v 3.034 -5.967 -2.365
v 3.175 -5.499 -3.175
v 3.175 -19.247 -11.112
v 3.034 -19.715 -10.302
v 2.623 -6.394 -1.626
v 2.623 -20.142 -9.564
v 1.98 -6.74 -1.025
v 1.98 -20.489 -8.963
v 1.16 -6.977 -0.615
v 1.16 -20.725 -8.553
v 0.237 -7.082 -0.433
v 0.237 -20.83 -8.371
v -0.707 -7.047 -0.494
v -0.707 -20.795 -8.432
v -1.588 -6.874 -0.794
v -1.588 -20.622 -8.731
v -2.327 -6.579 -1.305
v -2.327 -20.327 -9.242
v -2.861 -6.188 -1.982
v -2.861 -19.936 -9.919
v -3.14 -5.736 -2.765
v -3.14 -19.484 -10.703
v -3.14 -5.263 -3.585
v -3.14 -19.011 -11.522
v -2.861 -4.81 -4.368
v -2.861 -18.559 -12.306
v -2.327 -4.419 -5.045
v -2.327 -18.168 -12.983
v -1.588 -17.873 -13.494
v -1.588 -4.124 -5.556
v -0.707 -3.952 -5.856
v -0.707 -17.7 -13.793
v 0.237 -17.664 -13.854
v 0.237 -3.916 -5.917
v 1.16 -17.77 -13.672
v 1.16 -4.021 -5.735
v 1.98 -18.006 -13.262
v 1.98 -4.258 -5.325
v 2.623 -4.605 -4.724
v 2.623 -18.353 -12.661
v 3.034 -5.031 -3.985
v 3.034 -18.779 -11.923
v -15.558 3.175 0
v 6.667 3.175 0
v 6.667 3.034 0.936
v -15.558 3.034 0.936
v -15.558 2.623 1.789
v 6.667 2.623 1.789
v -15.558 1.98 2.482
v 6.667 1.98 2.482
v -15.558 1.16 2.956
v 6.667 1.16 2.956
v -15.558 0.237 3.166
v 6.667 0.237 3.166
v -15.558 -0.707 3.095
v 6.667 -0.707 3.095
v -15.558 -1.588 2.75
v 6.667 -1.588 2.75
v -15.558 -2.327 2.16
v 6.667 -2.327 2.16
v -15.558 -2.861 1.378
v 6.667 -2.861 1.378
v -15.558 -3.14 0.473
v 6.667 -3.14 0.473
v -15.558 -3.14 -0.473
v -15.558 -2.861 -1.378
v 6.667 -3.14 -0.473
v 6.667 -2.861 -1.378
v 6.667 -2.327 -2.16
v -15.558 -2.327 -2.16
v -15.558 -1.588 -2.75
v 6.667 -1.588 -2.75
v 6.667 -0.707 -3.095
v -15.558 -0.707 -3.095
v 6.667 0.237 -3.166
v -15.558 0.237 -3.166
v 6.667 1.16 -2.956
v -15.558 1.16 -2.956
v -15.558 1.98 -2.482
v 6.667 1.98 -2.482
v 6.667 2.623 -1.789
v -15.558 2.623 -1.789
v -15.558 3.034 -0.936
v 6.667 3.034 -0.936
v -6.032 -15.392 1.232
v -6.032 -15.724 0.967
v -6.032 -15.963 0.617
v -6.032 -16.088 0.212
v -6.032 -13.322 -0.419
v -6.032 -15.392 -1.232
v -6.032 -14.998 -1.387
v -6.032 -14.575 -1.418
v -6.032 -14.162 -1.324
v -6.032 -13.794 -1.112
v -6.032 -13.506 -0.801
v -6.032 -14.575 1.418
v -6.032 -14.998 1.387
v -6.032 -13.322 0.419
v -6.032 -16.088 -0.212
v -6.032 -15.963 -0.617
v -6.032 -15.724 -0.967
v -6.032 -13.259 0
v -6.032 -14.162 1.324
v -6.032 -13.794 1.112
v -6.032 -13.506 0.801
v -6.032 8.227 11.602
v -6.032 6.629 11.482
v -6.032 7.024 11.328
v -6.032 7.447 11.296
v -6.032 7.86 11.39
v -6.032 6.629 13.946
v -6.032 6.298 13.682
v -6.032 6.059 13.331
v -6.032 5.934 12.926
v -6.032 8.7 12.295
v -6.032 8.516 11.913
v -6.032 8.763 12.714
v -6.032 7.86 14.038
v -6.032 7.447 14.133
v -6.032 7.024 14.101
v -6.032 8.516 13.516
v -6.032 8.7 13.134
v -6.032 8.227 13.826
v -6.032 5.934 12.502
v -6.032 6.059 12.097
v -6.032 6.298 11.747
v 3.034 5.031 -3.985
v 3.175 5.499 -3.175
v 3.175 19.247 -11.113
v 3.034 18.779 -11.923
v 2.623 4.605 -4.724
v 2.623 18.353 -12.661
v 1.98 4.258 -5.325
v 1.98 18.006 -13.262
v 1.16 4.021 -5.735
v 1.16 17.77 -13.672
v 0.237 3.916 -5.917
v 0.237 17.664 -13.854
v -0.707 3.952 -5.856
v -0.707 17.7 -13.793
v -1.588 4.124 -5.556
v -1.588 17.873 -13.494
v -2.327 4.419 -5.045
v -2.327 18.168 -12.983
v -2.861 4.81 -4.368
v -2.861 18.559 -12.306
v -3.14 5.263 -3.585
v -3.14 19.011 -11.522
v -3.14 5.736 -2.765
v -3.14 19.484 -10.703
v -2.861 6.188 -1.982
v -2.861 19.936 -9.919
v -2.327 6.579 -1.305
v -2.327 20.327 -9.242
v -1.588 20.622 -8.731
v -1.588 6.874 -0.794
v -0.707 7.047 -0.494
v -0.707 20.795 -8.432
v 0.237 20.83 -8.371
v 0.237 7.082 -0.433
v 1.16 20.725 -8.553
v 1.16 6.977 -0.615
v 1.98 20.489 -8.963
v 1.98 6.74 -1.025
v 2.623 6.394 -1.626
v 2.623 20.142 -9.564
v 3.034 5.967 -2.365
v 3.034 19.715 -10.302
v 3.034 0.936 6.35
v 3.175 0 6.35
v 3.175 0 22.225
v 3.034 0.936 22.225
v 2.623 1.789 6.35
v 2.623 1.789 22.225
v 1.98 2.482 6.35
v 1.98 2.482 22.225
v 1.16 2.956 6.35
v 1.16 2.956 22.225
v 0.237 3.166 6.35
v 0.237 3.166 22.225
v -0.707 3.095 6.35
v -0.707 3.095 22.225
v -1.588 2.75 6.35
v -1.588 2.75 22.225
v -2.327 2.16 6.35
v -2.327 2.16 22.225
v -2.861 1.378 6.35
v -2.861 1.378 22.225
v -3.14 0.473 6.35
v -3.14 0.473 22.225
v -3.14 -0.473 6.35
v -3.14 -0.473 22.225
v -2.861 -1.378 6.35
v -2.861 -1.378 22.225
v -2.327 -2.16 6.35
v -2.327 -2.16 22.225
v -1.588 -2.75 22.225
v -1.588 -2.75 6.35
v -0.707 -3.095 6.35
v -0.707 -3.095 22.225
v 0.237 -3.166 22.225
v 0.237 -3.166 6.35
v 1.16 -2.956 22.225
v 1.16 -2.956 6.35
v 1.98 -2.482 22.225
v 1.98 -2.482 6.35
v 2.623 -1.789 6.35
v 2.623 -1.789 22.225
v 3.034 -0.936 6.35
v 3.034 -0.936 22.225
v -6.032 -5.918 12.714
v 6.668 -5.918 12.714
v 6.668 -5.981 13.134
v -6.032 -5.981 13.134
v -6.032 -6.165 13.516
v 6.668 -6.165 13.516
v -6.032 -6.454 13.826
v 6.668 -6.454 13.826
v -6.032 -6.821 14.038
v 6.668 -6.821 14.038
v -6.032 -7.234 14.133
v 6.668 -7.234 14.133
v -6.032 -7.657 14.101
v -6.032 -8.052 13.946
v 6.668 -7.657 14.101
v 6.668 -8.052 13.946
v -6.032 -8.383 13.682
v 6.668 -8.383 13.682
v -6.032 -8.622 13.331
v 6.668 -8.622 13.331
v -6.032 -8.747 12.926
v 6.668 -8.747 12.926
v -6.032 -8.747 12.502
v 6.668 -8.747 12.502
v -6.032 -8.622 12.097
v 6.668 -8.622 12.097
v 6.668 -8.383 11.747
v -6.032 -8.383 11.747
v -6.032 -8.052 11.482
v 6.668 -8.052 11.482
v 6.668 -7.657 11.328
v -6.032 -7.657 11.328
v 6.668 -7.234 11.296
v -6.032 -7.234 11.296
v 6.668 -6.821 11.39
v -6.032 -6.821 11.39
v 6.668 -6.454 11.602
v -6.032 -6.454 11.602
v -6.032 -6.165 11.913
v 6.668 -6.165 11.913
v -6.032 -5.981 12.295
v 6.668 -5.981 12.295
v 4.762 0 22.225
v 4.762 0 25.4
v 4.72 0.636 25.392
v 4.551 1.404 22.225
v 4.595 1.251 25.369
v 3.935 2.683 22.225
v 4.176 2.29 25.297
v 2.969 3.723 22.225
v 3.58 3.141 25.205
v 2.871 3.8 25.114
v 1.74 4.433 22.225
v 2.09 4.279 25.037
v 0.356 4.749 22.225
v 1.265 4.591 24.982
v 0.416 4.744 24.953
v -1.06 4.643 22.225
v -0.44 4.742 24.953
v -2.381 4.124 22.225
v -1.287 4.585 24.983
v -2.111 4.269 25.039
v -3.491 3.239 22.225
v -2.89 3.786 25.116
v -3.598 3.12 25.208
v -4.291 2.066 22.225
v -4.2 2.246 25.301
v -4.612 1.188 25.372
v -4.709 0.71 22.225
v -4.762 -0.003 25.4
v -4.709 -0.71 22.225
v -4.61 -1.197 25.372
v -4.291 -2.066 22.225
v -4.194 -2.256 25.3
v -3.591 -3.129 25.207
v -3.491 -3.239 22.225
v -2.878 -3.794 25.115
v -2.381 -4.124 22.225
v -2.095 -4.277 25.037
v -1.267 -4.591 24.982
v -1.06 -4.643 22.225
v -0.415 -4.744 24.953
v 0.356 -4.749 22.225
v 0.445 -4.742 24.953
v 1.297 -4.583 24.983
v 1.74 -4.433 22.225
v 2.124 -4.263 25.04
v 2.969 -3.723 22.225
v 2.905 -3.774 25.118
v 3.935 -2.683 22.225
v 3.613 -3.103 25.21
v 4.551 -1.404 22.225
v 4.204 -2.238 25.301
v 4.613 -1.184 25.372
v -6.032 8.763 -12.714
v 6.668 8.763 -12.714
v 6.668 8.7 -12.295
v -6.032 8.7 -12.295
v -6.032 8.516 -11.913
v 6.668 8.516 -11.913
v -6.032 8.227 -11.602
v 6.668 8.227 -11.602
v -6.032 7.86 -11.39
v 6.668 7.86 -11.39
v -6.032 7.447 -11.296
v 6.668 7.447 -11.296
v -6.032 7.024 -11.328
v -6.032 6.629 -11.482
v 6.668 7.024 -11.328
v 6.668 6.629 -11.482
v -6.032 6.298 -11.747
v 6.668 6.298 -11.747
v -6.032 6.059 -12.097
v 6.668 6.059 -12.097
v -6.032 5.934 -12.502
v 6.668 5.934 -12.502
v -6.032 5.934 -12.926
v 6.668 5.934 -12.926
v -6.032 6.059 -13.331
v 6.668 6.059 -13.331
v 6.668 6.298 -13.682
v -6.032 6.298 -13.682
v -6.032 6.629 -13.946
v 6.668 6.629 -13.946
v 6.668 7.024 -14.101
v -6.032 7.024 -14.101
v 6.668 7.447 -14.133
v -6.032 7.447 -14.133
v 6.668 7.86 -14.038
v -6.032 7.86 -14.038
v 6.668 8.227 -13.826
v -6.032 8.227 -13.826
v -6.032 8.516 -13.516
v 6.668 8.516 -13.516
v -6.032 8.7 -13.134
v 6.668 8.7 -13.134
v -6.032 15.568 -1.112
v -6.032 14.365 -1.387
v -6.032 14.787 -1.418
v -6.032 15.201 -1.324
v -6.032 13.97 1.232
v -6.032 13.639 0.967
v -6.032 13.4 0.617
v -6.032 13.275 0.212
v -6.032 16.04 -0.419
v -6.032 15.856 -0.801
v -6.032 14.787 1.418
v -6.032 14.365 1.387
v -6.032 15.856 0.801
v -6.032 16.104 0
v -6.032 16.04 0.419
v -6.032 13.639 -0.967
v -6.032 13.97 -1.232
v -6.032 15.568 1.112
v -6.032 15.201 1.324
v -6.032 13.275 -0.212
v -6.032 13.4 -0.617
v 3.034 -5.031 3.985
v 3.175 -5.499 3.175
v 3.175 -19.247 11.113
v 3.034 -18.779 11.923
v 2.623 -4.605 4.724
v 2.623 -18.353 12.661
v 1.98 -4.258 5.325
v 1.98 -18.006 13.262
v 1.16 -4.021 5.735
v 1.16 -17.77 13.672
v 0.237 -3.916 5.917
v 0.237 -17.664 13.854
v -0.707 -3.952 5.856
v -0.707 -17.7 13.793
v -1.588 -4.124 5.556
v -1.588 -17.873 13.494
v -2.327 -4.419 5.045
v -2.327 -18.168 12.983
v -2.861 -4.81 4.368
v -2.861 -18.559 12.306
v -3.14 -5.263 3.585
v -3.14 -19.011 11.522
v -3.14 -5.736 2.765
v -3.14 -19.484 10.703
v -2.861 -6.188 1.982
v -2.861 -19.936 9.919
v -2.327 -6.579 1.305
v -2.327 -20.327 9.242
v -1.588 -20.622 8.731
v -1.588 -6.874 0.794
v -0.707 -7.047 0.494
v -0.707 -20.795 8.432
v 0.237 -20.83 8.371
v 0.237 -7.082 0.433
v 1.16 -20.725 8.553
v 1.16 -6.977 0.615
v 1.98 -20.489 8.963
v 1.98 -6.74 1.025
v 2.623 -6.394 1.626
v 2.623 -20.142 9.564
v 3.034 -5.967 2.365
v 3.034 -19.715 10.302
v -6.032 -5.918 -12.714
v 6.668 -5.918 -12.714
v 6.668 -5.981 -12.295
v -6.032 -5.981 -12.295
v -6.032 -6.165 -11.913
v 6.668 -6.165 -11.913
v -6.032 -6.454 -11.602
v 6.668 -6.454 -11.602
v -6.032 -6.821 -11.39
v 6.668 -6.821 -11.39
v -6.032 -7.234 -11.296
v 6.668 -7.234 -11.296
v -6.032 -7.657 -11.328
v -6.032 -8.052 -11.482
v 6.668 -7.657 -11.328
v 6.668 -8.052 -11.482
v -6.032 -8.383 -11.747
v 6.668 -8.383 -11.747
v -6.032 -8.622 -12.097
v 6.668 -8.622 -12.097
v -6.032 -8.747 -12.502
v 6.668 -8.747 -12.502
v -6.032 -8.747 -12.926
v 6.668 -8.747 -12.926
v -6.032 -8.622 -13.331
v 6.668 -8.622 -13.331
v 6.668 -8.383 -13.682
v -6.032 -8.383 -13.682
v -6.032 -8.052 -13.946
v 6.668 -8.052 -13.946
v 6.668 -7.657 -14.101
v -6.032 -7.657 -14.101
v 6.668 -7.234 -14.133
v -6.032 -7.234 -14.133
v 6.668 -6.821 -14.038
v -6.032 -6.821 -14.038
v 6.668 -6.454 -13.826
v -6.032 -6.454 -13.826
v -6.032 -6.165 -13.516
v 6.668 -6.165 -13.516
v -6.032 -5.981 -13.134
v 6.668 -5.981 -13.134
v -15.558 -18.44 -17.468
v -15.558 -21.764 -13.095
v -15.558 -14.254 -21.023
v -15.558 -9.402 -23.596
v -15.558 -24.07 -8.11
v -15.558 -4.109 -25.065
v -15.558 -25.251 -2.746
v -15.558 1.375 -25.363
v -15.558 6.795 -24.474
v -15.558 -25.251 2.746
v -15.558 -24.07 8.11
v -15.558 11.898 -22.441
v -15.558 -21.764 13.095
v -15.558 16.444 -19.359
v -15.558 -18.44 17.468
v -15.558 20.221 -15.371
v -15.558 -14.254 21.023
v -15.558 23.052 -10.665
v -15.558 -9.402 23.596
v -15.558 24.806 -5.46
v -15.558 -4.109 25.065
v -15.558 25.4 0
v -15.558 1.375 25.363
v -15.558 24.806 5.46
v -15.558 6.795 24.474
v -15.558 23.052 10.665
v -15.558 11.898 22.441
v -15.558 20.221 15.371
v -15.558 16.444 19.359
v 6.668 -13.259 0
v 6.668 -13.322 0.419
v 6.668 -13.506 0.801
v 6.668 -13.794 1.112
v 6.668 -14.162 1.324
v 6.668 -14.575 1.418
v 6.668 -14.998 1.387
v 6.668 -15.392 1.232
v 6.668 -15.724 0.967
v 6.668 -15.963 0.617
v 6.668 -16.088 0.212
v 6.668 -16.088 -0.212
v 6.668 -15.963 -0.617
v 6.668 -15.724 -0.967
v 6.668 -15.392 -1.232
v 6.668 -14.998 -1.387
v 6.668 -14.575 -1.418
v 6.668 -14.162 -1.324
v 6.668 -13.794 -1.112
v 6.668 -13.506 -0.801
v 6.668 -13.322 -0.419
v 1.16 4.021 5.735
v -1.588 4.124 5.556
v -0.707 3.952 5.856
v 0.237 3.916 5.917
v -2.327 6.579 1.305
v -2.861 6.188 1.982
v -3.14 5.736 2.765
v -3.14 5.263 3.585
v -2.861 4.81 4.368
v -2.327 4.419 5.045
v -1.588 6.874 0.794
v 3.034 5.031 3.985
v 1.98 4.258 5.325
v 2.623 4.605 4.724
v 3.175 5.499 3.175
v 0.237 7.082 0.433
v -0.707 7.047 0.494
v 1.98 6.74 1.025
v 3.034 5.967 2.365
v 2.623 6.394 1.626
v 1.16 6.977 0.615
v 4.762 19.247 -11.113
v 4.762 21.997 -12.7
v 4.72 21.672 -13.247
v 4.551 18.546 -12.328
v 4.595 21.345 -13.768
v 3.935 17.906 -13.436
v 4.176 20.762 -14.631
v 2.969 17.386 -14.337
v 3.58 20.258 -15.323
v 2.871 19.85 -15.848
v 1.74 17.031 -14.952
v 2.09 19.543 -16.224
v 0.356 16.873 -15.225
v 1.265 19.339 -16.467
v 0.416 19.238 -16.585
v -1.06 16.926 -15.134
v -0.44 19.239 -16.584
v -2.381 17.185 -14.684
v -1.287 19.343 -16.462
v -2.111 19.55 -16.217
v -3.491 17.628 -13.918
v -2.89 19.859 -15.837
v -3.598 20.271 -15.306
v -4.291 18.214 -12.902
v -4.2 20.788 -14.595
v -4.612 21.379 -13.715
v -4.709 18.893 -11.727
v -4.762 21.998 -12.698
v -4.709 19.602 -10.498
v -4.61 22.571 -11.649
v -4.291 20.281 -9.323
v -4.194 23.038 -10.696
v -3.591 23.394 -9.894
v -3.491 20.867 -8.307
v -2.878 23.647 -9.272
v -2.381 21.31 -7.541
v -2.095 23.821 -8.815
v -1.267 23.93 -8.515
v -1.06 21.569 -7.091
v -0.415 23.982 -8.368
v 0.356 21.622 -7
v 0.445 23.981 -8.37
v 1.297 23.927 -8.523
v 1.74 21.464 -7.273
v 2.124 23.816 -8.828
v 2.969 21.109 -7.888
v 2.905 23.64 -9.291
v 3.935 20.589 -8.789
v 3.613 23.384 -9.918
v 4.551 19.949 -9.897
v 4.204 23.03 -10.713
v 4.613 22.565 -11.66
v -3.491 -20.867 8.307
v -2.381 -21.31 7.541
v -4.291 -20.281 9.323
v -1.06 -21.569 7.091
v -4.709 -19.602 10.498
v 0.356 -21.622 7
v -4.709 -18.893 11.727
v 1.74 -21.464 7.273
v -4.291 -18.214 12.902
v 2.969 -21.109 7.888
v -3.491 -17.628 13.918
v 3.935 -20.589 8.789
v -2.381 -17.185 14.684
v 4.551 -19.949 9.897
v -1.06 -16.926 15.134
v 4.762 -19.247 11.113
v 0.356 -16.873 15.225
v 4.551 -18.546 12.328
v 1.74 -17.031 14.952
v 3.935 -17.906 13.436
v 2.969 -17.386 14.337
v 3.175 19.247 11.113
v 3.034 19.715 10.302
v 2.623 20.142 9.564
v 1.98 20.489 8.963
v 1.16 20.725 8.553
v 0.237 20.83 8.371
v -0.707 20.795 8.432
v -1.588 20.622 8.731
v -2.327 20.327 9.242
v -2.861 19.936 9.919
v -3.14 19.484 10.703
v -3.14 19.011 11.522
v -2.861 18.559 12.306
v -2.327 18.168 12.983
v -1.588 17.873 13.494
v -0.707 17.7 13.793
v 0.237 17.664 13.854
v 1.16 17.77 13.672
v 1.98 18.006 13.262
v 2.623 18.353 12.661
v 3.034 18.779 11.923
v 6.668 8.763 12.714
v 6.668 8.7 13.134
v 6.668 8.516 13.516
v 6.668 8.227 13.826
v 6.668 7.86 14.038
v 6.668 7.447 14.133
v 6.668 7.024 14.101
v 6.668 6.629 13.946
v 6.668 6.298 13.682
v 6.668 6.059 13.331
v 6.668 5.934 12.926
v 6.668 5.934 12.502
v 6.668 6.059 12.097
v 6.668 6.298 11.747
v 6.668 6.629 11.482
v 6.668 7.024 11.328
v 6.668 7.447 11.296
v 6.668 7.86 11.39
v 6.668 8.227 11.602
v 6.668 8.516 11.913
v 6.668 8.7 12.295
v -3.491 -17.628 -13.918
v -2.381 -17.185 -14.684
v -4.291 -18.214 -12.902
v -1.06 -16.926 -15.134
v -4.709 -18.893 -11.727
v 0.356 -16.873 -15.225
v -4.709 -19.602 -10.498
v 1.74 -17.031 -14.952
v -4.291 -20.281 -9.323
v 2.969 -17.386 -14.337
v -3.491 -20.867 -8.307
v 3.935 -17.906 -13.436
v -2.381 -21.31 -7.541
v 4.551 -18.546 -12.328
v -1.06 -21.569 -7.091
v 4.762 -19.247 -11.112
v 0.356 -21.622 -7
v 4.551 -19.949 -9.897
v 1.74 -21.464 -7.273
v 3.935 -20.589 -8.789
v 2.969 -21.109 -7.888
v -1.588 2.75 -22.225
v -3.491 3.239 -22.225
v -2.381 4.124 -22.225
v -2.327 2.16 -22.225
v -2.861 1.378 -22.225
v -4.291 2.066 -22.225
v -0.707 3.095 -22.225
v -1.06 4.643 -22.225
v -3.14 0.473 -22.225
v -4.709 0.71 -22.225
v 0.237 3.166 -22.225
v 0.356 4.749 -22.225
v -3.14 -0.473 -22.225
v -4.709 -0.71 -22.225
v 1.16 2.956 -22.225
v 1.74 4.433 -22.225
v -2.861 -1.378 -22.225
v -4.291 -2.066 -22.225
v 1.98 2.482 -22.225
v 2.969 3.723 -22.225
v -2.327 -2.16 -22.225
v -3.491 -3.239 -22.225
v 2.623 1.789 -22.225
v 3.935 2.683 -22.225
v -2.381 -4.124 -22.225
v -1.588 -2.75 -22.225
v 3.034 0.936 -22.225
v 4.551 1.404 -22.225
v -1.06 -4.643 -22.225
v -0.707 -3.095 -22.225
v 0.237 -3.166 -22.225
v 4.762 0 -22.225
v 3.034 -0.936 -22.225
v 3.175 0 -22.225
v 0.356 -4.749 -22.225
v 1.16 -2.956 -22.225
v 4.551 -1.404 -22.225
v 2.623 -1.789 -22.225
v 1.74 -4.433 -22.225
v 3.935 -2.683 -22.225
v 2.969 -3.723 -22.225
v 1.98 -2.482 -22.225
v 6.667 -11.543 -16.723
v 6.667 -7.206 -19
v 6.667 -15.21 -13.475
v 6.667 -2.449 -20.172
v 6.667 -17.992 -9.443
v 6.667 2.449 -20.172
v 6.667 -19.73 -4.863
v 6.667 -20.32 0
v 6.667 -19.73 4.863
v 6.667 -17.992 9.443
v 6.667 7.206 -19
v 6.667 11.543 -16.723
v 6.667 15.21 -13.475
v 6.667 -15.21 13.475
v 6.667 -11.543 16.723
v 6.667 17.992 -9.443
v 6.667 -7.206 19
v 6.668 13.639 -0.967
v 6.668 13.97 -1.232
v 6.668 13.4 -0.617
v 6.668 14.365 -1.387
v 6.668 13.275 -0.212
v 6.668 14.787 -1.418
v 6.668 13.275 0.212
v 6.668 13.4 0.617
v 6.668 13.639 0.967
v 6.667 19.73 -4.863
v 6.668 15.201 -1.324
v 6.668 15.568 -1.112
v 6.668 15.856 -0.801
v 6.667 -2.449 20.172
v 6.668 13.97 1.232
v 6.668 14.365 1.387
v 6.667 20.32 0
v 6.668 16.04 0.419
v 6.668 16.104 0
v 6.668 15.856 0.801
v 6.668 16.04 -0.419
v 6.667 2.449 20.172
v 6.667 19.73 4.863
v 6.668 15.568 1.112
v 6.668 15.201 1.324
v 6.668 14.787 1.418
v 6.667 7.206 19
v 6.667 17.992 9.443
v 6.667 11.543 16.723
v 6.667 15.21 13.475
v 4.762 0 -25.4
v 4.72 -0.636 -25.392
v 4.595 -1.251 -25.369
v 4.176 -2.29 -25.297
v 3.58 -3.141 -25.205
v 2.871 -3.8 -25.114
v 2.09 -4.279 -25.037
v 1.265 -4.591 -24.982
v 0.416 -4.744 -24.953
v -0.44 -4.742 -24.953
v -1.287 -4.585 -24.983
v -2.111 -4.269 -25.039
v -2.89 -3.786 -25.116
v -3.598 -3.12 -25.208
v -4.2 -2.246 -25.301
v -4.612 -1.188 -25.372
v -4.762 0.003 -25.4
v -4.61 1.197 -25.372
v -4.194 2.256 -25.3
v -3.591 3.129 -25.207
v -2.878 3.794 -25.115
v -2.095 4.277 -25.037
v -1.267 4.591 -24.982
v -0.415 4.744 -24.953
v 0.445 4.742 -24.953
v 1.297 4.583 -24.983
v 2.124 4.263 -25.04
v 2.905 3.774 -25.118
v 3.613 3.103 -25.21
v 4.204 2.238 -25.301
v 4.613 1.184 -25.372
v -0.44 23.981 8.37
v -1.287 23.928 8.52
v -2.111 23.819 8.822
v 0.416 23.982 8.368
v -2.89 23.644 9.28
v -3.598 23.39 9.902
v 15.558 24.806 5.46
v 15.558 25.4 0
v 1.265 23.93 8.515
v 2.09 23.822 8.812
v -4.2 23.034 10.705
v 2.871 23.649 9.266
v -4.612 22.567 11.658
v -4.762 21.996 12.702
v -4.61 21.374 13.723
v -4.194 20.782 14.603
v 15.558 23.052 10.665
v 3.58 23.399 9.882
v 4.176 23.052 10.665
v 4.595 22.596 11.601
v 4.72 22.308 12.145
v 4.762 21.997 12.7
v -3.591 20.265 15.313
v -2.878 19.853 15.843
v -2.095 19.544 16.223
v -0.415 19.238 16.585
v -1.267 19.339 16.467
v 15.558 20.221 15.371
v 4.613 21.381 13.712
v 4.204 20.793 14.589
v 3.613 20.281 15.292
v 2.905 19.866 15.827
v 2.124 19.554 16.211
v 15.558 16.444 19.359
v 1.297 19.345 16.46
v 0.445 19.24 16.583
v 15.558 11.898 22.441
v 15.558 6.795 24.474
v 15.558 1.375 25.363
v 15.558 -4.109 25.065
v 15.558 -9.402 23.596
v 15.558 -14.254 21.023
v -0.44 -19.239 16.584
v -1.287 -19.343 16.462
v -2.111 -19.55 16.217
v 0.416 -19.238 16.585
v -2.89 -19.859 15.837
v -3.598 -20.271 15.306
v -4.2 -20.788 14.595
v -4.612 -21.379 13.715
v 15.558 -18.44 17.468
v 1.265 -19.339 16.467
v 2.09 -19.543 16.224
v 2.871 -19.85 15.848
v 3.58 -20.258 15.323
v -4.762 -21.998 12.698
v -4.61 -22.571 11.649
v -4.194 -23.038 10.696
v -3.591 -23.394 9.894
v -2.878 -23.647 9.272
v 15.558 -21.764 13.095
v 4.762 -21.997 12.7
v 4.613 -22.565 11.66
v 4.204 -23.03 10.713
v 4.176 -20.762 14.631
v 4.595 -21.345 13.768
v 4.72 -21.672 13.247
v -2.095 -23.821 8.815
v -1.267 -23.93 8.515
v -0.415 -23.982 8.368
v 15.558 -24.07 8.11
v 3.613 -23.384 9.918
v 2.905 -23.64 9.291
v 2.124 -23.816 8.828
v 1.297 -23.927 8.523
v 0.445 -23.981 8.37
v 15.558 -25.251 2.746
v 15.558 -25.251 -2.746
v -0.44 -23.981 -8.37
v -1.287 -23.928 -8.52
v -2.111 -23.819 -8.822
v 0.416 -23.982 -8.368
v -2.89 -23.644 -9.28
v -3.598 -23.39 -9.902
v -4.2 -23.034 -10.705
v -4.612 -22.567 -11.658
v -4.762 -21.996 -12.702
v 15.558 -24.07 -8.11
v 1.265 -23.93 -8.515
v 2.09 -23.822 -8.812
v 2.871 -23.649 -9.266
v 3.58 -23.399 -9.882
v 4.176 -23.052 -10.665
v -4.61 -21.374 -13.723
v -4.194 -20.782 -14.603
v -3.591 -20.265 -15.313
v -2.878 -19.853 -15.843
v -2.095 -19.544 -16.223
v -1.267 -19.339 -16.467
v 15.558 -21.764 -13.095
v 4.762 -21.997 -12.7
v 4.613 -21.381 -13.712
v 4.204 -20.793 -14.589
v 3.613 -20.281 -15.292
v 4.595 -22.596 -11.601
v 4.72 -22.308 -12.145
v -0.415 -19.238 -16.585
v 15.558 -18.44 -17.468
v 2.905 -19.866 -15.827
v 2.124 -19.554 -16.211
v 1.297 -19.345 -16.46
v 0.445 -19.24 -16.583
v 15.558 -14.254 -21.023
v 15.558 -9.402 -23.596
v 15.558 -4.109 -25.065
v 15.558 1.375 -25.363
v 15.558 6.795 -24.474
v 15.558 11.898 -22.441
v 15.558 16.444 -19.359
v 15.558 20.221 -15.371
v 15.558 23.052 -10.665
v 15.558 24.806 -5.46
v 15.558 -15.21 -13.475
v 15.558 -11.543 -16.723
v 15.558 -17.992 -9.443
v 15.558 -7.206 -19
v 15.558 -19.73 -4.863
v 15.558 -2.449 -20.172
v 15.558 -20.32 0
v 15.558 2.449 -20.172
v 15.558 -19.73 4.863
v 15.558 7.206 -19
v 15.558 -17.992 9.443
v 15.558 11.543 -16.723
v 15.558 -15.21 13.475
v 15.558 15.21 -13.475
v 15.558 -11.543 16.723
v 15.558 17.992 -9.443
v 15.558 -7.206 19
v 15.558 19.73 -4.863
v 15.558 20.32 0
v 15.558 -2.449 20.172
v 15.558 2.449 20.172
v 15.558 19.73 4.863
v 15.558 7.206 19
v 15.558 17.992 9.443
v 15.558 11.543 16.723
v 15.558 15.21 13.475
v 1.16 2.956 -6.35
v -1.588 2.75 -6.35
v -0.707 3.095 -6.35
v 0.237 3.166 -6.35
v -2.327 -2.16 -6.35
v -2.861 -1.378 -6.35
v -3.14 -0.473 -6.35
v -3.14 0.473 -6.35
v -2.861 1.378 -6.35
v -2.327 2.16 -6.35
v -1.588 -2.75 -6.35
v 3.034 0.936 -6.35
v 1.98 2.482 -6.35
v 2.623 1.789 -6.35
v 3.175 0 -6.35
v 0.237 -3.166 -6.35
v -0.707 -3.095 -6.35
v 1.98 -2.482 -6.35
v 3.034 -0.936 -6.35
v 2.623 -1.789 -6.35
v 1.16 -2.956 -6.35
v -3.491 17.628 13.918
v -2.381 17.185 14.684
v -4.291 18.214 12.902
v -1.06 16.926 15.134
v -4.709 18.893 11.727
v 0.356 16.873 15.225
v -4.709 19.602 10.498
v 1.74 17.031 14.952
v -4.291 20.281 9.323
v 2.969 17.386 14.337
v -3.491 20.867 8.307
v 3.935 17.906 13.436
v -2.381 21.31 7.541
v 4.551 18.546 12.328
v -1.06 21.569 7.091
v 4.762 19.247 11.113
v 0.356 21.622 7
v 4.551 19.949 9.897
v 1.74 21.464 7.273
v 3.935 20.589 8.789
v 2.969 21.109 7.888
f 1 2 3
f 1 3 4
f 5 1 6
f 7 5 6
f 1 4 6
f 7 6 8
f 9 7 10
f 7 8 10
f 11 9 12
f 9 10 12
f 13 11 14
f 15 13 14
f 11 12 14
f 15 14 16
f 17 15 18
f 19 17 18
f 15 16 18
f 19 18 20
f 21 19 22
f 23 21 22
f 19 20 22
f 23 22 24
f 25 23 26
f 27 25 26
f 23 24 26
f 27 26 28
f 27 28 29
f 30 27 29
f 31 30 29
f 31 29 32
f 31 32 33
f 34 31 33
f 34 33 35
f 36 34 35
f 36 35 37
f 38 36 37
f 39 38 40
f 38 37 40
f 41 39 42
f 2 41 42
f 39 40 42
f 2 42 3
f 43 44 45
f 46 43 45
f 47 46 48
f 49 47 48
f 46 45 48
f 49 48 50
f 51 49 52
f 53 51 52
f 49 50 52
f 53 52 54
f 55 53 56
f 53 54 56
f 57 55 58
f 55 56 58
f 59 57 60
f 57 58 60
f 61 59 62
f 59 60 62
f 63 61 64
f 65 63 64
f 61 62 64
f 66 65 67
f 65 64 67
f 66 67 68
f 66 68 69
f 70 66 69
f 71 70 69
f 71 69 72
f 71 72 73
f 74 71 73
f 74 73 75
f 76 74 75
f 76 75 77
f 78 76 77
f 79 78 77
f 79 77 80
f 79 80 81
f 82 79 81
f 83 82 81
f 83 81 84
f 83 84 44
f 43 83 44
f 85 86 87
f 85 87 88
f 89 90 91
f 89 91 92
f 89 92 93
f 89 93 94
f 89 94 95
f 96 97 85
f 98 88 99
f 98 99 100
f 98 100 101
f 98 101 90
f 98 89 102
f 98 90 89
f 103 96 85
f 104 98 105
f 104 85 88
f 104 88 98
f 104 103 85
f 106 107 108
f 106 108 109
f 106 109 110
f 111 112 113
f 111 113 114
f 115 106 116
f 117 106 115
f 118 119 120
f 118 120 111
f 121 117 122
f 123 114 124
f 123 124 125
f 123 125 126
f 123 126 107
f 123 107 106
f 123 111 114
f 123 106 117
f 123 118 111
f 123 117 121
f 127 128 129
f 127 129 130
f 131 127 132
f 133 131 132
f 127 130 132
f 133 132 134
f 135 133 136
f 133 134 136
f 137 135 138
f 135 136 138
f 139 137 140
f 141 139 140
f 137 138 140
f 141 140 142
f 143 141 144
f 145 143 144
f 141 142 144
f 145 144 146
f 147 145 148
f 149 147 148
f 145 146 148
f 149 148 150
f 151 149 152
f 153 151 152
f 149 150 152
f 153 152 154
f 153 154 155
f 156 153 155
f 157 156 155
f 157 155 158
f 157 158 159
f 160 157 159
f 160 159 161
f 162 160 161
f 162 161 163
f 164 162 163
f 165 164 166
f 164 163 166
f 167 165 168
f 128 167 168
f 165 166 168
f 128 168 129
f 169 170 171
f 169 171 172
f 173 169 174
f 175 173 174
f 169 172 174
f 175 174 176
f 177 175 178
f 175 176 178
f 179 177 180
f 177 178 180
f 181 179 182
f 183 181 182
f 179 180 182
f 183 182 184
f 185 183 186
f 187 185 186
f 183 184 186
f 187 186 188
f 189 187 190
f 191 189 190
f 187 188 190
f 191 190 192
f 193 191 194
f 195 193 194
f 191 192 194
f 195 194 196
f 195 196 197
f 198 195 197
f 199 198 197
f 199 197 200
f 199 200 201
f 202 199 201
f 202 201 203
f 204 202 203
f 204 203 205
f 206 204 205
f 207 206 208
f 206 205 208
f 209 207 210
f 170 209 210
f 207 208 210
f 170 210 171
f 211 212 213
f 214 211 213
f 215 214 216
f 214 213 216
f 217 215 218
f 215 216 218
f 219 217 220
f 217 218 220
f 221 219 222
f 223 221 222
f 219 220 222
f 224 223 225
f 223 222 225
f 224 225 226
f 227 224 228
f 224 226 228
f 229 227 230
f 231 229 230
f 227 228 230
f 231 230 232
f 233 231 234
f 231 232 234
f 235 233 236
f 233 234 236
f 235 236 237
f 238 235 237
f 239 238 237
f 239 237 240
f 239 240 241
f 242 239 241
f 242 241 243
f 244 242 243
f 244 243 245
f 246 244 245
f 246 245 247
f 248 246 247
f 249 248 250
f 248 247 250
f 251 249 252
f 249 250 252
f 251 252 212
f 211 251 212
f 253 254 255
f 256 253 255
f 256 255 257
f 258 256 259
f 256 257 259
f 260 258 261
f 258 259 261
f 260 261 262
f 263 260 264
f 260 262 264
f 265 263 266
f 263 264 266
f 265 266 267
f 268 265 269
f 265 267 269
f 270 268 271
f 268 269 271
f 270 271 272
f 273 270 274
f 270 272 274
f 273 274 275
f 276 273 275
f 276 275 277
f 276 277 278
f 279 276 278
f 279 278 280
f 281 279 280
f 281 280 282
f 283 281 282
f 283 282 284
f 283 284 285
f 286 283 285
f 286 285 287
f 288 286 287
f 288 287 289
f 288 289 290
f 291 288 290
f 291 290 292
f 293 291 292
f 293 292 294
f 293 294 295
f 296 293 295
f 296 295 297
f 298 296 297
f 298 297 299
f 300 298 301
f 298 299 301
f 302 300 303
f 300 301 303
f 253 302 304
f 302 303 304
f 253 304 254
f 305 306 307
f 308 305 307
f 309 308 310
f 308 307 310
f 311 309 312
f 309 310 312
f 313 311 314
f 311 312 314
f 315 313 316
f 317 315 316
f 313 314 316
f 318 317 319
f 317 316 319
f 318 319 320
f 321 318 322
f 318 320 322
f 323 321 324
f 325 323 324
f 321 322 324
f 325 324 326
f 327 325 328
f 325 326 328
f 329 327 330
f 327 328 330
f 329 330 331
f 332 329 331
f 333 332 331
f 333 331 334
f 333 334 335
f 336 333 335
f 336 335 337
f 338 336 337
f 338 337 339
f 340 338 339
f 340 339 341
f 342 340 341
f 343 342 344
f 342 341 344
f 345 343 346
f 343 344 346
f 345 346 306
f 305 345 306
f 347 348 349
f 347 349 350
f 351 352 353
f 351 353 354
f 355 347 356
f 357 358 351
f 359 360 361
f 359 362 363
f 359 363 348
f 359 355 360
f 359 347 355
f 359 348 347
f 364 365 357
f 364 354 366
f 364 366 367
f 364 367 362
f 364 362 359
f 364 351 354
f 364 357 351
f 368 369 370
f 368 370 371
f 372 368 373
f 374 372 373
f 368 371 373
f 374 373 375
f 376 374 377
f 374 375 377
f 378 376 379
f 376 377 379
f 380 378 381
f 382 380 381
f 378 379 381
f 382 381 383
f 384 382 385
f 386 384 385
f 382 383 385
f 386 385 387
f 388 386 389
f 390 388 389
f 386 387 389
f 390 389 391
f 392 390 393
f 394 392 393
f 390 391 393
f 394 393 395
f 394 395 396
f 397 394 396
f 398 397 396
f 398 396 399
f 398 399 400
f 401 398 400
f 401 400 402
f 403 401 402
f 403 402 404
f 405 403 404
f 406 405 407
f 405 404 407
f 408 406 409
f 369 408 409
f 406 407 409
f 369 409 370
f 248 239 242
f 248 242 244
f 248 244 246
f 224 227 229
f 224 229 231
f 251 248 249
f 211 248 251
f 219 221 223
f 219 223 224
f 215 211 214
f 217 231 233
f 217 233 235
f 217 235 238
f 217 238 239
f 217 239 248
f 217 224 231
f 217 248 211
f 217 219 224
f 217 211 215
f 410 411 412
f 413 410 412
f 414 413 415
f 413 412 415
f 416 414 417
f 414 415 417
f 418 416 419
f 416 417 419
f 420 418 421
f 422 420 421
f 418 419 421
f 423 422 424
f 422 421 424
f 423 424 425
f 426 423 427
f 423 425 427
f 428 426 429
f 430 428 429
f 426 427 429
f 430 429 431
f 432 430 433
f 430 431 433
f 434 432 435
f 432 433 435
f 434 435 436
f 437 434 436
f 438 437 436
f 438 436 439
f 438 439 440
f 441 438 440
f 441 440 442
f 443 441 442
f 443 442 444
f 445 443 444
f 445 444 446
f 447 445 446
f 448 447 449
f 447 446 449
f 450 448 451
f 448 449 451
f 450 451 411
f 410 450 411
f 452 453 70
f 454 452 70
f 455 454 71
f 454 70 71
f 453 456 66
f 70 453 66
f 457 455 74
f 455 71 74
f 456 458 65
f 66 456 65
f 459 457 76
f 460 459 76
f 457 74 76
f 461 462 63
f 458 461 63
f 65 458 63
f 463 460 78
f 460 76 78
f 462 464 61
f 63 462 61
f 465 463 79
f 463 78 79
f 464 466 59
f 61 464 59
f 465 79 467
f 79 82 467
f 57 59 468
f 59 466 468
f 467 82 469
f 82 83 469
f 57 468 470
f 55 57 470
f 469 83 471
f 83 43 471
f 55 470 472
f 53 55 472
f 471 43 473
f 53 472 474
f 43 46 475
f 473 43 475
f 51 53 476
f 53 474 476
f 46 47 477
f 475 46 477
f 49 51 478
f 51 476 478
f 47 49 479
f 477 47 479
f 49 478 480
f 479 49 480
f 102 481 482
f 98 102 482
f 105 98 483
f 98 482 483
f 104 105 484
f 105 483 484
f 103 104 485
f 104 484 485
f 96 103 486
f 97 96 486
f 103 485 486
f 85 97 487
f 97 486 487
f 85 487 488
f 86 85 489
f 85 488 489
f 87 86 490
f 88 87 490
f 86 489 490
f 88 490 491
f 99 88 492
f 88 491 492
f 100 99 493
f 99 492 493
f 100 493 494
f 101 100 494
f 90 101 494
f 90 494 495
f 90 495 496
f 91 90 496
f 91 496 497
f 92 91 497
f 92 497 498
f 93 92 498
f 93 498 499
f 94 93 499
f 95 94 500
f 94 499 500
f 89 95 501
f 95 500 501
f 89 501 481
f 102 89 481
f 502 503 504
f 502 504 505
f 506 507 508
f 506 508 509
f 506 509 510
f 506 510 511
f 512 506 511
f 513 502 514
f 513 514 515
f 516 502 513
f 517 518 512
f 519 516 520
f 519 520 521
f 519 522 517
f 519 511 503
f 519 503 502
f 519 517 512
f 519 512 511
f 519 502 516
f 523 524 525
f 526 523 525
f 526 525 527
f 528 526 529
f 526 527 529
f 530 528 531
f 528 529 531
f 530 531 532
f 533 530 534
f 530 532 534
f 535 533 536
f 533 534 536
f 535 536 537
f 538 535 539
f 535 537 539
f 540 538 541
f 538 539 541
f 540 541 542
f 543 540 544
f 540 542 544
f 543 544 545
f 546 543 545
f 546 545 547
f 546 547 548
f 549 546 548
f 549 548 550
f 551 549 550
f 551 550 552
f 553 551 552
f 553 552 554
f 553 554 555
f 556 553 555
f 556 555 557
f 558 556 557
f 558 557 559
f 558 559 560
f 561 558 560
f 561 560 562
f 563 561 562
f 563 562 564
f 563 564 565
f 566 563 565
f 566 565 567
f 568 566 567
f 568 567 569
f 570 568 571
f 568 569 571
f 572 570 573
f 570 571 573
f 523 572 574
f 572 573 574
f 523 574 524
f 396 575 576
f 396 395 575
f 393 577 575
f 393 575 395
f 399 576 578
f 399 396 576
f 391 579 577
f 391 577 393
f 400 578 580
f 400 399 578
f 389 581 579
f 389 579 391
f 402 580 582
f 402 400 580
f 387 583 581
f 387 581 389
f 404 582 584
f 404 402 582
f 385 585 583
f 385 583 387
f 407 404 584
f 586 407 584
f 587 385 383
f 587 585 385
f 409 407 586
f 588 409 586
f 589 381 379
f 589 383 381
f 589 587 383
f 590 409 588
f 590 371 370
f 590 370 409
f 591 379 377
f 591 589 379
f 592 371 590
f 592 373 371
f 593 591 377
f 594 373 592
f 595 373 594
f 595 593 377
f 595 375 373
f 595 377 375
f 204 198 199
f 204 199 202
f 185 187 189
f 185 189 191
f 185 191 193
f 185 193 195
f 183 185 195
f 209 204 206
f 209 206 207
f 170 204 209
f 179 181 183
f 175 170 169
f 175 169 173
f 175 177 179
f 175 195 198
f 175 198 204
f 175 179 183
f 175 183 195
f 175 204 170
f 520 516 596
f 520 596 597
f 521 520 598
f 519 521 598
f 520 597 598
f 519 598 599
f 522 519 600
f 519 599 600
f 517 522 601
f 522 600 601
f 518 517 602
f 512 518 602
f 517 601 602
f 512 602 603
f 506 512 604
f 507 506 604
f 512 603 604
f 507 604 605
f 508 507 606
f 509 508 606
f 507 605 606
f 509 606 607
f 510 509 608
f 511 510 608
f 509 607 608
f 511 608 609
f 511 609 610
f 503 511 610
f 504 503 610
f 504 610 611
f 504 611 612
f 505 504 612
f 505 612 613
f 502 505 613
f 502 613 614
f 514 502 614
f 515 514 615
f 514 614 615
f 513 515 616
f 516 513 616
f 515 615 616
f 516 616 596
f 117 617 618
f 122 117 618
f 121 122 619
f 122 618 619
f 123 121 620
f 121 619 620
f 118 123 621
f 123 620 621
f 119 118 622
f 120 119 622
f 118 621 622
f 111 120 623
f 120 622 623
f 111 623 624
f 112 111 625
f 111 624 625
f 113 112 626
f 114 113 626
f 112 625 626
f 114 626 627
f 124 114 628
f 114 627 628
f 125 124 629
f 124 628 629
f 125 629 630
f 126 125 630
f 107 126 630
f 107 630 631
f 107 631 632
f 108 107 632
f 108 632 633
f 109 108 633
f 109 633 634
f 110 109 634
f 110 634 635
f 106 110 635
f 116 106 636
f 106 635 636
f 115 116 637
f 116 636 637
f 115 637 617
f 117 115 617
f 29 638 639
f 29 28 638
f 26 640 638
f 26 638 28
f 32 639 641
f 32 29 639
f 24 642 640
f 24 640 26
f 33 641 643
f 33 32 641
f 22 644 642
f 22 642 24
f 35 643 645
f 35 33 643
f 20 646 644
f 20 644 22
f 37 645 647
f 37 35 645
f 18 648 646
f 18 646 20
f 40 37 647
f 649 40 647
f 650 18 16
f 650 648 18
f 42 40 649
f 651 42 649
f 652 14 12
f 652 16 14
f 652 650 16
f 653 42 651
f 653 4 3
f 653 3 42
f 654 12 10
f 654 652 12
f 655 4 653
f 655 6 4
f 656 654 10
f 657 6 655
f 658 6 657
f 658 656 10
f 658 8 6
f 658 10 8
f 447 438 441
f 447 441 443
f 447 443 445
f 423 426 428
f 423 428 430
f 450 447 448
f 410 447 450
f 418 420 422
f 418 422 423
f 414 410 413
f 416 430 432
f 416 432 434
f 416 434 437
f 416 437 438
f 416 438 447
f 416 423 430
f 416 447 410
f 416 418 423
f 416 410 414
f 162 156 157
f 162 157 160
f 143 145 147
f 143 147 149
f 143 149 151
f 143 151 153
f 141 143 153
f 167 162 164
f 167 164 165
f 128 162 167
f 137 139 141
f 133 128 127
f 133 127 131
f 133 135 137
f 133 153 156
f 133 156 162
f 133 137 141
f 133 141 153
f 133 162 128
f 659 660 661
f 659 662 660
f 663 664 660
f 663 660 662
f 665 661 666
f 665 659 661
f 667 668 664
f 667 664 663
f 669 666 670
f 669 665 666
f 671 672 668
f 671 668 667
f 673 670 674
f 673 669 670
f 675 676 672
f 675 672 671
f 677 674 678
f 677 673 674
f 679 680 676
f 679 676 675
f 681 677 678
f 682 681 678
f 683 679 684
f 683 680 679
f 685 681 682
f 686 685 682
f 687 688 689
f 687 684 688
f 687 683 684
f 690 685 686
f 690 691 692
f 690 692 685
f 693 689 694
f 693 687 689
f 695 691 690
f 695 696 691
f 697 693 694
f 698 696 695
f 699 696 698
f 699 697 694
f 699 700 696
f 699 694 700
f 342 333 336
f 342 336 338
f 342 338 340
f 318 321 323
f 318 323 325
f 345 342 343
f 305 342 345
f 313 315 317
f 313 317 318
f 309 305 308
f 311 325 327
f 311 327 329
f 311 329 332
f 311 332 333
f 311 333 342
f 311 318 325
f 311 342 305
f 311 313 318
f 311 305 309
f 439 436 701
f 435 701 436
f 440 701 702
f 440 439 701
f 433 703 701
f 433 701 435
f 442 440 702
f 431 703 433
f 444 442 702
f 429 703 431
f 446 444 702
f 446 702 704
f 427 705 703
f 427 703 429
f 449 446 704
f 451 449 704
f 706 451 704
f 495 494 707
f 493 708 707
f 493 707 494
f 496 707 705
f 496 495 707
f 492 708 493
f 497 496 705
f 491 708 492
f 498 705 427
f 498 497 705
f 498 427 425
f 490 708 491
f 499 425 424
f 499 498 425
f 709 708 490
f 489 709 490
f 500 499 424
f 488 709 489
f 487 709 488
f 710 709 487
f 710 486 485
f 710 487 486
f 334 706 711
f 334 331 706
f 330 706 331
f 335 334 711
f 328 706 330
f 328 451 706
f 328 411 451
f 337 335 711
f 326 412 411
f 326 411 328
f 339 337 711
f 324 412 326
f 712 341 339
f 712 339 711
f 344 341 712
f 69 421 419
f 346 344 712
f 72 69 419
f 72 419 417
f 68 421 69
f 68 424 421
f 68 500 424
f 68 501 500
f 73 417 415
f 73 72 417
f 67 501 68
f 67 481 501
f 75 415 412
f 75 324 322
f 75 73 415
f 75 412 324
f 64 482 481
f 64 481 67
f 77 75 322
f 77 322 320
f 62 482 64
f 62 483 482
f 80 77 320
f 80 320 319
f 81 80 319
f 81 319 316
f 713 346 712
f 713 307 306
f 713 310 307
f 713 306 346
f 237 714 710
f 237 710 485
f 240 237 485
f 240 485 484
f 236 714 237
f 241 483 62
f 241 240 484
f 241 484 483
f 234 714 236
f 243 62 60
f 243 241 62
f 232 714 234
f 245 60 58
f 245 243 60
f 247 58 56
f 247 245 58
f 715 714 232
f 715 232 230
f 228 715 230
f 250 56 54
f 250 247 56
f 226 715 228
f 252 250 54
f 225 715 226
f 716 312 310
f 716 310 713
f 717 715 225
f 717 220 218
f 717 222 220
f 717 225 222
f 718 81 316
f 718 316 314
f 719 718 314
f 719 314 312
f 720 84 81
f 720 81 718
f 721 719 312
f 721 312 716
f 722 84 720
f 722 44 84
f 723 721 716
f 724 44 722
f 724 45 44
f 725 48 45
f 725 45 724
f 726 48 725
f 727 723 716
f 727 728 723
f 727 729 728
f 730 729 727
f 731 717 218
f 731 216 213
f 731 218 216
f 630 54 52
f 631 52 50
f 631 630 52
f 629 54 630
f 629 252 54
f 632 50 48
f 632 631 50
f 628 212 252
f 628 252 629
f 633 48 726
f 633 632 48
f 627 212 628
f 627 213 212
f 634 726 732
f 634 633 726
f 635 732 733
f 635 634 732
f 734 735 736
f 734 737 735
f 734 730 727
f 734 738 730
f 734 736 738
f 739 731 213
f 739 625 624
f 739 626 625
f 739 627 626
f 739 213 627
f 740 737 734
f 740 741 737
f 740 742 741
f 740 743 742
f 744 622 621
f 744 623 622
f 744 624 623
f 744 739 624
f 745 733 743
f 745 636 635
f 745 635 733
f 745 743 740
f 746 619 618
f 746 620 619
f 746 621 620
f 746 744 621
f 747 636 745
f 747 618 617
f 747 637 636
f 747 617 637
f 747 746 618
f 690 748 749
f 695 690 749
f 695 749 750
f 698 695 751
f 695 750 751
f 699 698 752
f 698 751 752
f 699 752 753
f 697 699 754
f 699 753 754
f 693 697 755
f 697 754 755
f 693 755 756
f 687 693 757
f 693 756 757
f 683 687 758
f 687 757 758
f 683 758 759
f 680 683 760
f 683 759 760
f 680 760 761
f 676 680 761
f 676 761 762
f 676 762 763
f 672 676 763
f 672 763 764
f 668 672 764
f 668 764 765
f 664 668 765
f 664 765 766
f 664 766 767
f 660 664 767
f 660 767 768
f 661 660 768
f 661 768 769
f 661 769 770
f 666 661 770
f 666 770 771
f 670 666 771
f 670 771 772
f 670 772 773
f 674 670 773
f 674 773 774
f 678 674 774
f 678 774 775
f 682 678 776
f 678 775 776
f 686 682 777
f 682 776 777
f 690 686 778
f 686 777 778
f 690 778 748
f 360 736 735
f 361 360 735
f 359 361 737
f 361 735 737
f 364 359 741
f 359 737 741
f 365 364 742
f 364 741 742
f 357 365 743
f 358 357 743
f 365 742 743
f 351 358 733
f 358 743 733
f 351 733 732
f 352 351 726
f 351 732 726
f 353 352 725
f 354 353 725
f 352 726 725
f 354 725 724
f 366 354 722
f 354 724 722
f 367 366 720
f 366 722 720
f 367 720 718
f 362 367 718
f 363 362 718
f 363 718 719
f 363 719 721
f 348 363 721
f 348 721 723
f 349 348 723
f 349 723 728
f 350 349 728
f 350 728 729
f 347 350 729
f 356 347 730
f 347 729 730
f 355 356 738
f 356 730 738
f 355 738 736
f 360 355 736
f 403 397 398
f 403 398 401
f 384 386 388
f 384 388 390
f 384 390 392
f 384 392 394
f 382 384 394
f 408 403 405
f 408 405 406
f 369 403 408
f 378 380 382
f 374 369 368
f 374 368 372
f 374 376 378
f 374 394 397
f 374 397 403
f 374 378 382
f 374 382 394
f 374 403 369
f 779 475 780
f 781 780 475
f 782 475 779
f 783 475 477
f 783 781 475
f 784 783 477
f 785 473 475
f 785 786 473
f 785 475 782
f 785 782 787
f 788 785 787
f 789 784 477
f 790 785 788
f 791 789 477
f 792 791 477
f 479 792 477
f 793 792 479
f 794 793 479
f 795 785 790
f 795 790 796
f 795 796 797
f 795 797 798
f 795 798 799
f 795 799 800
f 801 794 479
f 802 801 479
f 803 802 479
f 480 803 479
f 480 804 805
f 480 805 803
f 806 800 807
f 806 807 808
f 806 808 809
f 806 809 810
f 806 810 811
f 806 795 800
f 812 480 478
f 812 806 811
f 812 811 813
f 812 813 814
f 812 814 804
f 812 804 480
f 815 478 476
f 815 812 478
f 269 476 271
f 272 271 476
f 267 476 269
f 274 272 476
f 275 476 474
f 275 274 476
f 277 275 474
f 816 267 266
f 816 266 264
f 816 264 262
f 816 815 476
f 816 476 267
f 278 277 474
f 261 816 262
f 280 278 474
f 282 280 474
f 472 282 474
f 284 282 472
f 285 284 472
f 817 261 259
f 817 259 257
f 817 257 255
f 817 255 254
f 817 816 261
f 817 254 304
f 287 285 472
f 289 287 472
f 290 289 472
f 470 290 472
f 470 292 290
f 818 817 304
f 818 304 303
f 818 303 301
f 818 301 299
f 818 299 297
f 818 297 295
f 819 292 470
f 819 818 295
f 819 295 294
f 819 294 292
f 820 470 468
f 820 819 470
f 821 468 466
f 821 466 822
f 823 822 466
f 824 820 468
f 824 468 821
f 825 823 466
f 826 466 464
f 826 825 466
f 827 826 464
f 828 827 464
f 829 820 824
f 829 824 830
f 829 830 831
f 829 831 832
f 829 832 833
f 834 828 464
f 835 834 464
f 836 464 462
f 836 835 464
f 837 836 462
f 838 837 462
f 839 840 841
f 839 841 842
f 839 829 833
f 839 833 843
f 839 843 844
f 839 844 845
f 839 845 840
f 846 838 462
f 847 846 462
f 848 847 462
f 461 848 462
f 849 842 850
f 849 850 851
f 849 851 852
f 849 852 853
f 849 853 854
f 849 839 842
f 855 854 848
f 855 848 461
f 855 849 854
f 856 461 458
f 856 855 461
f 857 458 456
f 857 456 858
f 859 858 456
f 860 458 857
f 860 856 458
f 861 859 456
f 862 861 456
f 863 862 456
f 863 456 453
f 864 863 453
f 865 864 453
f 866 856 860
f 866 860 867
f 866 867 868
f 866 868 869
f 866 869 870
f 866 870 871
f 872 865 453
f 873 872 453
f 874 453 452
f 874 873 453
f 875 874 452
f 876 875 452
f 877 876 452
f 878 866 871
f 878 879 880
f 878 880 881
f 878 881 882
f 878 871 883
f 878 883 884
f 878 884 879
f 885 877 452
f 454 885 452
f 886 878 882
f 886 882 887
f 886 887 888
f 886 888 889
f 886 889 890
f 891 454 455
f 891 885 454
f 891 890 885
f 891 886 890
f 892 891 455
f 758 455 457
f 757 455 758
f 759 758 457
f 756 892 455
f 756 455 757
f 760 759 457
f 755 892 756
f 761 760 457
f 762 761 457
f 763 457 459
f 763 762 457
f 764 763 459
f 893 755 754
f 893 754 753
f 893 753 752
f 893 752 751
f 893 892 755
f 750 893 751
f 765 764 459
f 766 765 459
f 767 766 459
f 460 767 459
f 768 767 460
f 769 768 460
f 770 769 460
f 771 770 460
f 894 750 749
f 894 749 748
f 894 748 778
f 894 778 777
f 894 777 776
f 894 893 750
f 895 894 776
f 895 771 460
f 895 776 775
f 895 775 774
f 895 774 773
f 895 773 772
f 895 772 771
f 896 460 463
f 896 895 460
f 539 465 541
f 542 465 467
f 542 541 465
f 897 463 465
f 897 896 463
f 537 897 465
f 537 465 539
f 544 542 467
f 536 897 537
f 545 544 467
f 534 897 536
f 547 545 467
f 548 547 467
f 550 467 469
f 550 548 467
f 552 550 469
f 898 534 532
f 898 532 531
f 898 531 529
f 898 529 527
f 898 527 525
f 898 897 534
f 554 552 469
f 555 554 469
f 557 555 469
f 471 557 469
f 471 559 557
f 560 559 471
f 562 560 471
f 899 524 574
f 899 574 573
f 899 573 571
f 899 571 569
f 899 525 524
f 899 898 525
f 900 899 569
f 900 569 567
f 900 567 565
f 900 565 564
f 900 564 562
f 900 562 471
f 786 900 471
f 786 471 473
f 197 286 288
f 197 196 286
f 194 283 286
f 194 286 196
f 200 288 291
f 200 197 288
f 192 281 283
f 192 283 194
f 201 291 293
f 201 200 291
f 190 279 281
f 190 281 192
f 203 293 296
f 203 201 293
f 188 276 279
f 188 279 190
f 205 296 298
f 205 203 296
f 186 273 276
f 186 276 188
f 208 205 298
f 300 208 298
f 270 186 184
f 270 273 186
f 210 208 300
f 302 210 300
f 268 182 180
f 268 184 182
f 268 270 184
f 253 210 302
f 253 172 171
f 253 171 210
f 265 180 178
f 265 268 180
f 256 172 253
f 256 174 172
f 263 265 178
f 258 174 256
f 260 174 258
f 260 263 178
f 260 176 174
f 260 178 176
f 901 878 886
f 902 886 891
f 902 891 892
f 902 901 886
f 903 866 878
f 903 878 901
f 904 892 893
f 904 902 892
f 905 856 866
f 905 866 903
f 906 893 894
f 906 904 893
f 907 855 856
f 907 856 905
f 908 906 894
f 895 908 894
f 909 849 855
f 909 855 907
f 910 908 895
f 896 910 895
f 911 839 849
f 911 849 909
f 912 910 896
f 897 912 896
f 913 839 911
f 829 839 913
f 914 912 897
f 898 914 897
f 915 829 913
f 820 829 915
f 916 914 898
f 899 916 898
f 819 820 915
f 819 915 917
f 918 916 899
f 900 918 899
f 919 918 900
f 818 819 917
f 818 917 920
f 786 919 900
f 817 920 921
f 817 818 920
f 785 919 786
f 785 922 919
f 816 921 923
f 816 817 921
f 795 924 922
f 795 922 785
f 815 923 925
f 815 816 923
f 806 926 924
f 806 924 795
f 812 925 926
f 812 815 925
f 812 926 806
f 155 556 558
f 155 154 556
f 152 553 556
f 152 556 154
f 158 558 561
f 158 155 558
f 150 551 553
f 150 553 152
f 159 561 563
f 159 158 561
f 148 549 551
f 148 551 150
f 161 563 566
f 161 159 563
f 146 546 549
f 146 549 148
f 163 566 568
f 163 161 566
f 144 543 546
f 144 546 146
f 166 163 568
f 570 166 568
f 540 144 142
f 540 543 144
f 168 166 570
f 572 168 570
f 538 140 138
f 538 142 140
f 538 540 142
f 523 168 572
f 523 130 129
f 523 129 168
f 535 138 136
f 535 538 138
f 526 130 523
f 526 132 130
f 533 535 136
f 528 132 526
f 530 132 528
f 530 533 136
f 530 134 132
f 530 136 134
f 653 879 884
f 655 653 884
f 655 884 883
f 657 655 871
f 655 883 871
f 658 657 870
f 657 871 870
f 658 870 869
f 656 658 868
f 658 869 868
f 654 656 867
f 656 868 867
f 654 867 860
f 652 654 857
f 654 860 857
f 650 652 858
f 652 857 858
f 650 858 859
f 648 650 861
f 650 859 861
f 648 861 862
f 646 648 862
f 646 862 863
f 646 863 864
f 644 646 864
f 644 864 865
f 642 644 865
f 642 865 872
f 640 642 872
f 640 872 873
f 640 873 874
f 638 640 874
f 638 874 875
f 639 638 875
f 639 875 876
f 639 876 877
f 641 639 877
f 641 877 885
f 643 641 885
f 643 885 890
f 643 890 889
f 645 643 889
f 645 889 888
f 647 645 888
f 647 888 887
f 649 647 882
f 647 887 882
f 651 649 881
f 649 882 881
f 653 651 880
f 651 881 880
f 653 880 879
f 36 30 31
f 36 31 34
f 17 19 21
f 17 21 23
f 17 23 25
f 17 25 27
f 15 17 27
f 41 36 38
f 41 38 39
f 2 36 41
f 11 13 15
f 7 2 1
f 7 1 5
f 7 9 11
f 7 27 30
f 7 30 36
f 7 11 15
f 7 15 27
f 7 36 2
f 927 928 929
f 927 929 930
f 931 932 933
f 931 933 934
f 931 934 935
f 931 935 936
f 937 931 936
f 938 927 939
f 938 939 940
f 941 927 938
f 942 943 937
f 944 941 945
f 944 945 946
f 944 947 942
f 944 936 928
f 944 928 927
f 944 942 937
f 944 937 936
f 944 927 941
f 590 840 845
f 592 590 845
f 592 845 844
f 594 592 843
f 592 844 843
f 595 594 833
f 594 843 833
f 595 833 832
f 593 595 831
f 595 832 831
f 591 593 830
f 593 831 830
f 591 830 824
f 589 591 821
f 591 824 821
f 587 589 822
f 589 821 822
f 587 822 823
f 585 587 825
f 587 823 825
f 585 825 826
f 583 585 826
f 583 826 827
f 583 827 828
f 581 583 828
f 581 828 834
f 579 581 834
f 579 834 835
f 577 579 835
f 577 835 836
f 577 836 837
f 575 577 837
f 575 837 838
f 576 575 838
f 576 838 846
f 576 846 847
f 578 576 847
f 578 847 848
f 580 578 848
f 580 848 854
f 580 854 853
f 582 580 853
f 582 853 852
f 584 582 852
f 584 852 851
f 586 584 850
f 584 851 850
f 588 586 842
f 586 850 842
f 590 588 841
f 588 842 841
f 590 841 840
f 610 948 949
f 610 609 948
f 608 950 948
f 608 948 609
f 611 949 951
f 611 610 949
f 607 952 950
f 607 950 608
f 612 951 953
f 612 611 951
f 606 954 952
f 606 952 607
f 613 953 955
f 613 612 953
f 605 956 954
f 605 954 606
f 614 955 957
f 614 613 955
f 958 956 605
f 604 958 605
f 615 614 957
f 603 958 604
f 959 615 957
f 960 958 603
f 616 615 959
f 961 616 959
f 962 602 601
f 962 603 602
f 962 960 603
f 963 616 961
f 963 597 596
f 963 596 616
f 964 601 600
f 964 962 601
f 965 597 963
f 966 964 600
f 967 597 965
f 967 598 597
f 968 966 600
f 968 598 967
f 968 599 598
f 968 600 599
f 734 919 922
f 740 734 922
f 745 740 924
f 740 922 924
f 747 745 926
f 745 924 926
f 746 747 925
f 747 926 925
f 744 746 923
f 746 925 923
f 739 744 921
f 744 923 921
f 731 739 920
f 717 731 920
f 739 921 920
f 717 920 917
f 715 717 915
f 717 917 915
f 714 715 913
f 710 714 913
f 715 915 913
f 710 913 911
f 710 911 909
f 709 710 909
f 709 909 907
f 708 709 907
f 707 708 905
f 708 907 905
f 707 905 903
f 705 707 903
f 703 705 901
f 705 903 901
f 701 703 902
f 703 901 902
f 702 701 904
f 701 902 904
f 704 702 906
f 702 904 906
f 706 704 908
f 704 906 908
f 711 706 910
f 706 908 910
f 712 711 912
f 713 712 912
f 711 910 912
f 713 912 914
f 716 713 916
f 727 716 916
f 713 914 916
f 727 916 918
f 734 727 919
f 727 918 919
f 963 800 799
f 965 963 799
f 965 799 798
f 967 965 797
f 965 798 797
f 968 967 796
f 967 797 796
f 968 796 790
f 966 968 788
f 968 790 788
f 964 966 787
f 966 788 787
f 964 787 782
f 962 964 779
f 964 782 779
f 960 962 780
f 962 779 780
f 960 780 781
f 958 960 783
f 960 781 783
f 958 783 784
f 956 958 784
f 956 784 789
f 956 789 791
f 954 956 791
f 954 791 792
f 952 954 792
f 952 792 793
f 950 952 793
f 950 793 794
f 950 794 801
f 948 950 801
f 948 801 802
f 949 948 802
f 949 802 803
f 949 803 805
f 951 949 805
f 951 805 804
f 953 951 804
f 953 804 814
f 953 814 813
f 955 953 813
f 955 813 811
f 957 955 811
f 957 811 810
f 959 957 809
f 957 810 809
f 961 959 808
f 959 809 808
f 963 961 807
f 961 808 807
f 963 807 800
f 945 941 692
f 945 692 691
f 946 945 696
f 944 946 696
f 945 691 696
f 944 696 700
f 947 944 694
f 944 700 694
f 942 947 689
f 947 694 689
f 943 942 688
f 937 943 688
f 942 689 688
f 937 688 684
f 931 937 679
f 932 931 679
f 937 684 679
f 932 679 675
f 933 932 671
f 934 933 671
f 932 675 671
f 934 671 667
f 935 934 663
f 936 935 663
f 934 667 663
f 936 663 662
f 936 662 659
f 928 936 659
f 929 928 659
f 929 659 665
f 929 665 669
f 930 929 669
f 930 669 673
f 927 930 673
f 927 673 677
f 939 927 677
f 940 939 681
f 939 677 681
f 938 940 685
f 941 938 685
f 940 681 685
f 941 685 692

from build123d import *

# Parameters (mm, degrees)
F0_R             = 25.4
F1_DEPTH         = 15.5575
F2_R             = 3.175
F3_DEPTH         = 31.116
F4_R             = 20.32
F5_DEPTH         = 8.89
F6_R             = 1.4224
F7_DEPTH         = 12.7
F9_R             = 4.7625
F9_R_2           = 3.175
F10_DEPTH        = 3.175
F10_COPIES_COUNT = 6
F11_R            = 3.175
F12_DEPTH        = 15.875
F12_COPIES_COUNT = 6


# Not quite as in the source:
# - a pattern or mirror of a feature is missing from the dataset's text; its kind, count and spacing are read off the source's solid


with BuildPart() as f1:
    # F0 (on Right) → F1 (new body, symmetric)
    with BuildSketch(Plane.YZ):
        Circle(F0_R)
    extrude(amount=F1_DEPTH, both=True)

    # F2 (on face) → F3 (cut, through all)
    with BuildSketch(Plane.YZ.offset(15.5575)):
        Circle(F2_R)
    extrude(amount=-F3_DEPTH, mode=Mode.SUBTRACT)

    # F4 (on face) → F5 (cut)
    with BuildSketch(Plane.YZ.offset(15.5575)):
        Circle(F4_R)
    extrude(amount=-F5_DEPTH, mode=Mode.SUBTRACT)

    # F6 (on face) → F7 (cut)
    with BuildSketch(Plane.YZ.offset(6.6675)):
        with Locations((14.6812, 0)):
            Circle(F6_R)
        with Locations((7.3406, -12.714292158)):
            Circle(F6_R)
        with Locations((-7.3406, -12.714292158)):
            Circle(F6_R)
        with Locations((-14.6812, 0)):
            Circle(F6_R)
        with Locations((-7.3406, 12.714292158)):
            Circle(F6_R)
        with Locations((7.3406, 12.714292158)):
            Circle(F6_R)
    extrude(amount=-F7_DEPTH, mode=Mode.SUBTRACT)

    # F9 (on offset) → F10 (cut)
    with BuildSketch(Plane.XY.offset(25.4)):
        Circle(F9_R)
        Circle(F9_R_2, mode=Mode.SUBTRACT)
        Circle(F9_R_2)
    f10 = extrude(amount=-F10_DEPTH, mode=Mode.SUBTRACT)

    # F10_copies: F10 ×6 about axis
    f10_copies_axis = Axis((0, 0, 0), (1, 0, 0))
    for i in range(1, F10_COPIES_COUNT):
        add(f10.rotate(f10_copies_axis, i * 360 / F10_COPIES_COUNT), mode=Mode.SUBTRACT)

    # F11 (on face) → F12 (cut)
    with BuildSketch(Plane.XY.offset(22.225)):
        Circle(F11_R)
    f12 = extrude(amount=-F12_DEPTH, mode=Mode.SUBTRACT)

    # F12_copies: F12 ×6 about axis
    f12_copies_axis = Axis((0, 0, 0), (1, 0, 0))
    for i in range(1, F12_COPIES_COUNT):
        add(f12.rotate(f12_copies_axis, i * 360 / F12_COPIES_COUNT), mode=Mode.SUBTRACT)


solid = f1.part
